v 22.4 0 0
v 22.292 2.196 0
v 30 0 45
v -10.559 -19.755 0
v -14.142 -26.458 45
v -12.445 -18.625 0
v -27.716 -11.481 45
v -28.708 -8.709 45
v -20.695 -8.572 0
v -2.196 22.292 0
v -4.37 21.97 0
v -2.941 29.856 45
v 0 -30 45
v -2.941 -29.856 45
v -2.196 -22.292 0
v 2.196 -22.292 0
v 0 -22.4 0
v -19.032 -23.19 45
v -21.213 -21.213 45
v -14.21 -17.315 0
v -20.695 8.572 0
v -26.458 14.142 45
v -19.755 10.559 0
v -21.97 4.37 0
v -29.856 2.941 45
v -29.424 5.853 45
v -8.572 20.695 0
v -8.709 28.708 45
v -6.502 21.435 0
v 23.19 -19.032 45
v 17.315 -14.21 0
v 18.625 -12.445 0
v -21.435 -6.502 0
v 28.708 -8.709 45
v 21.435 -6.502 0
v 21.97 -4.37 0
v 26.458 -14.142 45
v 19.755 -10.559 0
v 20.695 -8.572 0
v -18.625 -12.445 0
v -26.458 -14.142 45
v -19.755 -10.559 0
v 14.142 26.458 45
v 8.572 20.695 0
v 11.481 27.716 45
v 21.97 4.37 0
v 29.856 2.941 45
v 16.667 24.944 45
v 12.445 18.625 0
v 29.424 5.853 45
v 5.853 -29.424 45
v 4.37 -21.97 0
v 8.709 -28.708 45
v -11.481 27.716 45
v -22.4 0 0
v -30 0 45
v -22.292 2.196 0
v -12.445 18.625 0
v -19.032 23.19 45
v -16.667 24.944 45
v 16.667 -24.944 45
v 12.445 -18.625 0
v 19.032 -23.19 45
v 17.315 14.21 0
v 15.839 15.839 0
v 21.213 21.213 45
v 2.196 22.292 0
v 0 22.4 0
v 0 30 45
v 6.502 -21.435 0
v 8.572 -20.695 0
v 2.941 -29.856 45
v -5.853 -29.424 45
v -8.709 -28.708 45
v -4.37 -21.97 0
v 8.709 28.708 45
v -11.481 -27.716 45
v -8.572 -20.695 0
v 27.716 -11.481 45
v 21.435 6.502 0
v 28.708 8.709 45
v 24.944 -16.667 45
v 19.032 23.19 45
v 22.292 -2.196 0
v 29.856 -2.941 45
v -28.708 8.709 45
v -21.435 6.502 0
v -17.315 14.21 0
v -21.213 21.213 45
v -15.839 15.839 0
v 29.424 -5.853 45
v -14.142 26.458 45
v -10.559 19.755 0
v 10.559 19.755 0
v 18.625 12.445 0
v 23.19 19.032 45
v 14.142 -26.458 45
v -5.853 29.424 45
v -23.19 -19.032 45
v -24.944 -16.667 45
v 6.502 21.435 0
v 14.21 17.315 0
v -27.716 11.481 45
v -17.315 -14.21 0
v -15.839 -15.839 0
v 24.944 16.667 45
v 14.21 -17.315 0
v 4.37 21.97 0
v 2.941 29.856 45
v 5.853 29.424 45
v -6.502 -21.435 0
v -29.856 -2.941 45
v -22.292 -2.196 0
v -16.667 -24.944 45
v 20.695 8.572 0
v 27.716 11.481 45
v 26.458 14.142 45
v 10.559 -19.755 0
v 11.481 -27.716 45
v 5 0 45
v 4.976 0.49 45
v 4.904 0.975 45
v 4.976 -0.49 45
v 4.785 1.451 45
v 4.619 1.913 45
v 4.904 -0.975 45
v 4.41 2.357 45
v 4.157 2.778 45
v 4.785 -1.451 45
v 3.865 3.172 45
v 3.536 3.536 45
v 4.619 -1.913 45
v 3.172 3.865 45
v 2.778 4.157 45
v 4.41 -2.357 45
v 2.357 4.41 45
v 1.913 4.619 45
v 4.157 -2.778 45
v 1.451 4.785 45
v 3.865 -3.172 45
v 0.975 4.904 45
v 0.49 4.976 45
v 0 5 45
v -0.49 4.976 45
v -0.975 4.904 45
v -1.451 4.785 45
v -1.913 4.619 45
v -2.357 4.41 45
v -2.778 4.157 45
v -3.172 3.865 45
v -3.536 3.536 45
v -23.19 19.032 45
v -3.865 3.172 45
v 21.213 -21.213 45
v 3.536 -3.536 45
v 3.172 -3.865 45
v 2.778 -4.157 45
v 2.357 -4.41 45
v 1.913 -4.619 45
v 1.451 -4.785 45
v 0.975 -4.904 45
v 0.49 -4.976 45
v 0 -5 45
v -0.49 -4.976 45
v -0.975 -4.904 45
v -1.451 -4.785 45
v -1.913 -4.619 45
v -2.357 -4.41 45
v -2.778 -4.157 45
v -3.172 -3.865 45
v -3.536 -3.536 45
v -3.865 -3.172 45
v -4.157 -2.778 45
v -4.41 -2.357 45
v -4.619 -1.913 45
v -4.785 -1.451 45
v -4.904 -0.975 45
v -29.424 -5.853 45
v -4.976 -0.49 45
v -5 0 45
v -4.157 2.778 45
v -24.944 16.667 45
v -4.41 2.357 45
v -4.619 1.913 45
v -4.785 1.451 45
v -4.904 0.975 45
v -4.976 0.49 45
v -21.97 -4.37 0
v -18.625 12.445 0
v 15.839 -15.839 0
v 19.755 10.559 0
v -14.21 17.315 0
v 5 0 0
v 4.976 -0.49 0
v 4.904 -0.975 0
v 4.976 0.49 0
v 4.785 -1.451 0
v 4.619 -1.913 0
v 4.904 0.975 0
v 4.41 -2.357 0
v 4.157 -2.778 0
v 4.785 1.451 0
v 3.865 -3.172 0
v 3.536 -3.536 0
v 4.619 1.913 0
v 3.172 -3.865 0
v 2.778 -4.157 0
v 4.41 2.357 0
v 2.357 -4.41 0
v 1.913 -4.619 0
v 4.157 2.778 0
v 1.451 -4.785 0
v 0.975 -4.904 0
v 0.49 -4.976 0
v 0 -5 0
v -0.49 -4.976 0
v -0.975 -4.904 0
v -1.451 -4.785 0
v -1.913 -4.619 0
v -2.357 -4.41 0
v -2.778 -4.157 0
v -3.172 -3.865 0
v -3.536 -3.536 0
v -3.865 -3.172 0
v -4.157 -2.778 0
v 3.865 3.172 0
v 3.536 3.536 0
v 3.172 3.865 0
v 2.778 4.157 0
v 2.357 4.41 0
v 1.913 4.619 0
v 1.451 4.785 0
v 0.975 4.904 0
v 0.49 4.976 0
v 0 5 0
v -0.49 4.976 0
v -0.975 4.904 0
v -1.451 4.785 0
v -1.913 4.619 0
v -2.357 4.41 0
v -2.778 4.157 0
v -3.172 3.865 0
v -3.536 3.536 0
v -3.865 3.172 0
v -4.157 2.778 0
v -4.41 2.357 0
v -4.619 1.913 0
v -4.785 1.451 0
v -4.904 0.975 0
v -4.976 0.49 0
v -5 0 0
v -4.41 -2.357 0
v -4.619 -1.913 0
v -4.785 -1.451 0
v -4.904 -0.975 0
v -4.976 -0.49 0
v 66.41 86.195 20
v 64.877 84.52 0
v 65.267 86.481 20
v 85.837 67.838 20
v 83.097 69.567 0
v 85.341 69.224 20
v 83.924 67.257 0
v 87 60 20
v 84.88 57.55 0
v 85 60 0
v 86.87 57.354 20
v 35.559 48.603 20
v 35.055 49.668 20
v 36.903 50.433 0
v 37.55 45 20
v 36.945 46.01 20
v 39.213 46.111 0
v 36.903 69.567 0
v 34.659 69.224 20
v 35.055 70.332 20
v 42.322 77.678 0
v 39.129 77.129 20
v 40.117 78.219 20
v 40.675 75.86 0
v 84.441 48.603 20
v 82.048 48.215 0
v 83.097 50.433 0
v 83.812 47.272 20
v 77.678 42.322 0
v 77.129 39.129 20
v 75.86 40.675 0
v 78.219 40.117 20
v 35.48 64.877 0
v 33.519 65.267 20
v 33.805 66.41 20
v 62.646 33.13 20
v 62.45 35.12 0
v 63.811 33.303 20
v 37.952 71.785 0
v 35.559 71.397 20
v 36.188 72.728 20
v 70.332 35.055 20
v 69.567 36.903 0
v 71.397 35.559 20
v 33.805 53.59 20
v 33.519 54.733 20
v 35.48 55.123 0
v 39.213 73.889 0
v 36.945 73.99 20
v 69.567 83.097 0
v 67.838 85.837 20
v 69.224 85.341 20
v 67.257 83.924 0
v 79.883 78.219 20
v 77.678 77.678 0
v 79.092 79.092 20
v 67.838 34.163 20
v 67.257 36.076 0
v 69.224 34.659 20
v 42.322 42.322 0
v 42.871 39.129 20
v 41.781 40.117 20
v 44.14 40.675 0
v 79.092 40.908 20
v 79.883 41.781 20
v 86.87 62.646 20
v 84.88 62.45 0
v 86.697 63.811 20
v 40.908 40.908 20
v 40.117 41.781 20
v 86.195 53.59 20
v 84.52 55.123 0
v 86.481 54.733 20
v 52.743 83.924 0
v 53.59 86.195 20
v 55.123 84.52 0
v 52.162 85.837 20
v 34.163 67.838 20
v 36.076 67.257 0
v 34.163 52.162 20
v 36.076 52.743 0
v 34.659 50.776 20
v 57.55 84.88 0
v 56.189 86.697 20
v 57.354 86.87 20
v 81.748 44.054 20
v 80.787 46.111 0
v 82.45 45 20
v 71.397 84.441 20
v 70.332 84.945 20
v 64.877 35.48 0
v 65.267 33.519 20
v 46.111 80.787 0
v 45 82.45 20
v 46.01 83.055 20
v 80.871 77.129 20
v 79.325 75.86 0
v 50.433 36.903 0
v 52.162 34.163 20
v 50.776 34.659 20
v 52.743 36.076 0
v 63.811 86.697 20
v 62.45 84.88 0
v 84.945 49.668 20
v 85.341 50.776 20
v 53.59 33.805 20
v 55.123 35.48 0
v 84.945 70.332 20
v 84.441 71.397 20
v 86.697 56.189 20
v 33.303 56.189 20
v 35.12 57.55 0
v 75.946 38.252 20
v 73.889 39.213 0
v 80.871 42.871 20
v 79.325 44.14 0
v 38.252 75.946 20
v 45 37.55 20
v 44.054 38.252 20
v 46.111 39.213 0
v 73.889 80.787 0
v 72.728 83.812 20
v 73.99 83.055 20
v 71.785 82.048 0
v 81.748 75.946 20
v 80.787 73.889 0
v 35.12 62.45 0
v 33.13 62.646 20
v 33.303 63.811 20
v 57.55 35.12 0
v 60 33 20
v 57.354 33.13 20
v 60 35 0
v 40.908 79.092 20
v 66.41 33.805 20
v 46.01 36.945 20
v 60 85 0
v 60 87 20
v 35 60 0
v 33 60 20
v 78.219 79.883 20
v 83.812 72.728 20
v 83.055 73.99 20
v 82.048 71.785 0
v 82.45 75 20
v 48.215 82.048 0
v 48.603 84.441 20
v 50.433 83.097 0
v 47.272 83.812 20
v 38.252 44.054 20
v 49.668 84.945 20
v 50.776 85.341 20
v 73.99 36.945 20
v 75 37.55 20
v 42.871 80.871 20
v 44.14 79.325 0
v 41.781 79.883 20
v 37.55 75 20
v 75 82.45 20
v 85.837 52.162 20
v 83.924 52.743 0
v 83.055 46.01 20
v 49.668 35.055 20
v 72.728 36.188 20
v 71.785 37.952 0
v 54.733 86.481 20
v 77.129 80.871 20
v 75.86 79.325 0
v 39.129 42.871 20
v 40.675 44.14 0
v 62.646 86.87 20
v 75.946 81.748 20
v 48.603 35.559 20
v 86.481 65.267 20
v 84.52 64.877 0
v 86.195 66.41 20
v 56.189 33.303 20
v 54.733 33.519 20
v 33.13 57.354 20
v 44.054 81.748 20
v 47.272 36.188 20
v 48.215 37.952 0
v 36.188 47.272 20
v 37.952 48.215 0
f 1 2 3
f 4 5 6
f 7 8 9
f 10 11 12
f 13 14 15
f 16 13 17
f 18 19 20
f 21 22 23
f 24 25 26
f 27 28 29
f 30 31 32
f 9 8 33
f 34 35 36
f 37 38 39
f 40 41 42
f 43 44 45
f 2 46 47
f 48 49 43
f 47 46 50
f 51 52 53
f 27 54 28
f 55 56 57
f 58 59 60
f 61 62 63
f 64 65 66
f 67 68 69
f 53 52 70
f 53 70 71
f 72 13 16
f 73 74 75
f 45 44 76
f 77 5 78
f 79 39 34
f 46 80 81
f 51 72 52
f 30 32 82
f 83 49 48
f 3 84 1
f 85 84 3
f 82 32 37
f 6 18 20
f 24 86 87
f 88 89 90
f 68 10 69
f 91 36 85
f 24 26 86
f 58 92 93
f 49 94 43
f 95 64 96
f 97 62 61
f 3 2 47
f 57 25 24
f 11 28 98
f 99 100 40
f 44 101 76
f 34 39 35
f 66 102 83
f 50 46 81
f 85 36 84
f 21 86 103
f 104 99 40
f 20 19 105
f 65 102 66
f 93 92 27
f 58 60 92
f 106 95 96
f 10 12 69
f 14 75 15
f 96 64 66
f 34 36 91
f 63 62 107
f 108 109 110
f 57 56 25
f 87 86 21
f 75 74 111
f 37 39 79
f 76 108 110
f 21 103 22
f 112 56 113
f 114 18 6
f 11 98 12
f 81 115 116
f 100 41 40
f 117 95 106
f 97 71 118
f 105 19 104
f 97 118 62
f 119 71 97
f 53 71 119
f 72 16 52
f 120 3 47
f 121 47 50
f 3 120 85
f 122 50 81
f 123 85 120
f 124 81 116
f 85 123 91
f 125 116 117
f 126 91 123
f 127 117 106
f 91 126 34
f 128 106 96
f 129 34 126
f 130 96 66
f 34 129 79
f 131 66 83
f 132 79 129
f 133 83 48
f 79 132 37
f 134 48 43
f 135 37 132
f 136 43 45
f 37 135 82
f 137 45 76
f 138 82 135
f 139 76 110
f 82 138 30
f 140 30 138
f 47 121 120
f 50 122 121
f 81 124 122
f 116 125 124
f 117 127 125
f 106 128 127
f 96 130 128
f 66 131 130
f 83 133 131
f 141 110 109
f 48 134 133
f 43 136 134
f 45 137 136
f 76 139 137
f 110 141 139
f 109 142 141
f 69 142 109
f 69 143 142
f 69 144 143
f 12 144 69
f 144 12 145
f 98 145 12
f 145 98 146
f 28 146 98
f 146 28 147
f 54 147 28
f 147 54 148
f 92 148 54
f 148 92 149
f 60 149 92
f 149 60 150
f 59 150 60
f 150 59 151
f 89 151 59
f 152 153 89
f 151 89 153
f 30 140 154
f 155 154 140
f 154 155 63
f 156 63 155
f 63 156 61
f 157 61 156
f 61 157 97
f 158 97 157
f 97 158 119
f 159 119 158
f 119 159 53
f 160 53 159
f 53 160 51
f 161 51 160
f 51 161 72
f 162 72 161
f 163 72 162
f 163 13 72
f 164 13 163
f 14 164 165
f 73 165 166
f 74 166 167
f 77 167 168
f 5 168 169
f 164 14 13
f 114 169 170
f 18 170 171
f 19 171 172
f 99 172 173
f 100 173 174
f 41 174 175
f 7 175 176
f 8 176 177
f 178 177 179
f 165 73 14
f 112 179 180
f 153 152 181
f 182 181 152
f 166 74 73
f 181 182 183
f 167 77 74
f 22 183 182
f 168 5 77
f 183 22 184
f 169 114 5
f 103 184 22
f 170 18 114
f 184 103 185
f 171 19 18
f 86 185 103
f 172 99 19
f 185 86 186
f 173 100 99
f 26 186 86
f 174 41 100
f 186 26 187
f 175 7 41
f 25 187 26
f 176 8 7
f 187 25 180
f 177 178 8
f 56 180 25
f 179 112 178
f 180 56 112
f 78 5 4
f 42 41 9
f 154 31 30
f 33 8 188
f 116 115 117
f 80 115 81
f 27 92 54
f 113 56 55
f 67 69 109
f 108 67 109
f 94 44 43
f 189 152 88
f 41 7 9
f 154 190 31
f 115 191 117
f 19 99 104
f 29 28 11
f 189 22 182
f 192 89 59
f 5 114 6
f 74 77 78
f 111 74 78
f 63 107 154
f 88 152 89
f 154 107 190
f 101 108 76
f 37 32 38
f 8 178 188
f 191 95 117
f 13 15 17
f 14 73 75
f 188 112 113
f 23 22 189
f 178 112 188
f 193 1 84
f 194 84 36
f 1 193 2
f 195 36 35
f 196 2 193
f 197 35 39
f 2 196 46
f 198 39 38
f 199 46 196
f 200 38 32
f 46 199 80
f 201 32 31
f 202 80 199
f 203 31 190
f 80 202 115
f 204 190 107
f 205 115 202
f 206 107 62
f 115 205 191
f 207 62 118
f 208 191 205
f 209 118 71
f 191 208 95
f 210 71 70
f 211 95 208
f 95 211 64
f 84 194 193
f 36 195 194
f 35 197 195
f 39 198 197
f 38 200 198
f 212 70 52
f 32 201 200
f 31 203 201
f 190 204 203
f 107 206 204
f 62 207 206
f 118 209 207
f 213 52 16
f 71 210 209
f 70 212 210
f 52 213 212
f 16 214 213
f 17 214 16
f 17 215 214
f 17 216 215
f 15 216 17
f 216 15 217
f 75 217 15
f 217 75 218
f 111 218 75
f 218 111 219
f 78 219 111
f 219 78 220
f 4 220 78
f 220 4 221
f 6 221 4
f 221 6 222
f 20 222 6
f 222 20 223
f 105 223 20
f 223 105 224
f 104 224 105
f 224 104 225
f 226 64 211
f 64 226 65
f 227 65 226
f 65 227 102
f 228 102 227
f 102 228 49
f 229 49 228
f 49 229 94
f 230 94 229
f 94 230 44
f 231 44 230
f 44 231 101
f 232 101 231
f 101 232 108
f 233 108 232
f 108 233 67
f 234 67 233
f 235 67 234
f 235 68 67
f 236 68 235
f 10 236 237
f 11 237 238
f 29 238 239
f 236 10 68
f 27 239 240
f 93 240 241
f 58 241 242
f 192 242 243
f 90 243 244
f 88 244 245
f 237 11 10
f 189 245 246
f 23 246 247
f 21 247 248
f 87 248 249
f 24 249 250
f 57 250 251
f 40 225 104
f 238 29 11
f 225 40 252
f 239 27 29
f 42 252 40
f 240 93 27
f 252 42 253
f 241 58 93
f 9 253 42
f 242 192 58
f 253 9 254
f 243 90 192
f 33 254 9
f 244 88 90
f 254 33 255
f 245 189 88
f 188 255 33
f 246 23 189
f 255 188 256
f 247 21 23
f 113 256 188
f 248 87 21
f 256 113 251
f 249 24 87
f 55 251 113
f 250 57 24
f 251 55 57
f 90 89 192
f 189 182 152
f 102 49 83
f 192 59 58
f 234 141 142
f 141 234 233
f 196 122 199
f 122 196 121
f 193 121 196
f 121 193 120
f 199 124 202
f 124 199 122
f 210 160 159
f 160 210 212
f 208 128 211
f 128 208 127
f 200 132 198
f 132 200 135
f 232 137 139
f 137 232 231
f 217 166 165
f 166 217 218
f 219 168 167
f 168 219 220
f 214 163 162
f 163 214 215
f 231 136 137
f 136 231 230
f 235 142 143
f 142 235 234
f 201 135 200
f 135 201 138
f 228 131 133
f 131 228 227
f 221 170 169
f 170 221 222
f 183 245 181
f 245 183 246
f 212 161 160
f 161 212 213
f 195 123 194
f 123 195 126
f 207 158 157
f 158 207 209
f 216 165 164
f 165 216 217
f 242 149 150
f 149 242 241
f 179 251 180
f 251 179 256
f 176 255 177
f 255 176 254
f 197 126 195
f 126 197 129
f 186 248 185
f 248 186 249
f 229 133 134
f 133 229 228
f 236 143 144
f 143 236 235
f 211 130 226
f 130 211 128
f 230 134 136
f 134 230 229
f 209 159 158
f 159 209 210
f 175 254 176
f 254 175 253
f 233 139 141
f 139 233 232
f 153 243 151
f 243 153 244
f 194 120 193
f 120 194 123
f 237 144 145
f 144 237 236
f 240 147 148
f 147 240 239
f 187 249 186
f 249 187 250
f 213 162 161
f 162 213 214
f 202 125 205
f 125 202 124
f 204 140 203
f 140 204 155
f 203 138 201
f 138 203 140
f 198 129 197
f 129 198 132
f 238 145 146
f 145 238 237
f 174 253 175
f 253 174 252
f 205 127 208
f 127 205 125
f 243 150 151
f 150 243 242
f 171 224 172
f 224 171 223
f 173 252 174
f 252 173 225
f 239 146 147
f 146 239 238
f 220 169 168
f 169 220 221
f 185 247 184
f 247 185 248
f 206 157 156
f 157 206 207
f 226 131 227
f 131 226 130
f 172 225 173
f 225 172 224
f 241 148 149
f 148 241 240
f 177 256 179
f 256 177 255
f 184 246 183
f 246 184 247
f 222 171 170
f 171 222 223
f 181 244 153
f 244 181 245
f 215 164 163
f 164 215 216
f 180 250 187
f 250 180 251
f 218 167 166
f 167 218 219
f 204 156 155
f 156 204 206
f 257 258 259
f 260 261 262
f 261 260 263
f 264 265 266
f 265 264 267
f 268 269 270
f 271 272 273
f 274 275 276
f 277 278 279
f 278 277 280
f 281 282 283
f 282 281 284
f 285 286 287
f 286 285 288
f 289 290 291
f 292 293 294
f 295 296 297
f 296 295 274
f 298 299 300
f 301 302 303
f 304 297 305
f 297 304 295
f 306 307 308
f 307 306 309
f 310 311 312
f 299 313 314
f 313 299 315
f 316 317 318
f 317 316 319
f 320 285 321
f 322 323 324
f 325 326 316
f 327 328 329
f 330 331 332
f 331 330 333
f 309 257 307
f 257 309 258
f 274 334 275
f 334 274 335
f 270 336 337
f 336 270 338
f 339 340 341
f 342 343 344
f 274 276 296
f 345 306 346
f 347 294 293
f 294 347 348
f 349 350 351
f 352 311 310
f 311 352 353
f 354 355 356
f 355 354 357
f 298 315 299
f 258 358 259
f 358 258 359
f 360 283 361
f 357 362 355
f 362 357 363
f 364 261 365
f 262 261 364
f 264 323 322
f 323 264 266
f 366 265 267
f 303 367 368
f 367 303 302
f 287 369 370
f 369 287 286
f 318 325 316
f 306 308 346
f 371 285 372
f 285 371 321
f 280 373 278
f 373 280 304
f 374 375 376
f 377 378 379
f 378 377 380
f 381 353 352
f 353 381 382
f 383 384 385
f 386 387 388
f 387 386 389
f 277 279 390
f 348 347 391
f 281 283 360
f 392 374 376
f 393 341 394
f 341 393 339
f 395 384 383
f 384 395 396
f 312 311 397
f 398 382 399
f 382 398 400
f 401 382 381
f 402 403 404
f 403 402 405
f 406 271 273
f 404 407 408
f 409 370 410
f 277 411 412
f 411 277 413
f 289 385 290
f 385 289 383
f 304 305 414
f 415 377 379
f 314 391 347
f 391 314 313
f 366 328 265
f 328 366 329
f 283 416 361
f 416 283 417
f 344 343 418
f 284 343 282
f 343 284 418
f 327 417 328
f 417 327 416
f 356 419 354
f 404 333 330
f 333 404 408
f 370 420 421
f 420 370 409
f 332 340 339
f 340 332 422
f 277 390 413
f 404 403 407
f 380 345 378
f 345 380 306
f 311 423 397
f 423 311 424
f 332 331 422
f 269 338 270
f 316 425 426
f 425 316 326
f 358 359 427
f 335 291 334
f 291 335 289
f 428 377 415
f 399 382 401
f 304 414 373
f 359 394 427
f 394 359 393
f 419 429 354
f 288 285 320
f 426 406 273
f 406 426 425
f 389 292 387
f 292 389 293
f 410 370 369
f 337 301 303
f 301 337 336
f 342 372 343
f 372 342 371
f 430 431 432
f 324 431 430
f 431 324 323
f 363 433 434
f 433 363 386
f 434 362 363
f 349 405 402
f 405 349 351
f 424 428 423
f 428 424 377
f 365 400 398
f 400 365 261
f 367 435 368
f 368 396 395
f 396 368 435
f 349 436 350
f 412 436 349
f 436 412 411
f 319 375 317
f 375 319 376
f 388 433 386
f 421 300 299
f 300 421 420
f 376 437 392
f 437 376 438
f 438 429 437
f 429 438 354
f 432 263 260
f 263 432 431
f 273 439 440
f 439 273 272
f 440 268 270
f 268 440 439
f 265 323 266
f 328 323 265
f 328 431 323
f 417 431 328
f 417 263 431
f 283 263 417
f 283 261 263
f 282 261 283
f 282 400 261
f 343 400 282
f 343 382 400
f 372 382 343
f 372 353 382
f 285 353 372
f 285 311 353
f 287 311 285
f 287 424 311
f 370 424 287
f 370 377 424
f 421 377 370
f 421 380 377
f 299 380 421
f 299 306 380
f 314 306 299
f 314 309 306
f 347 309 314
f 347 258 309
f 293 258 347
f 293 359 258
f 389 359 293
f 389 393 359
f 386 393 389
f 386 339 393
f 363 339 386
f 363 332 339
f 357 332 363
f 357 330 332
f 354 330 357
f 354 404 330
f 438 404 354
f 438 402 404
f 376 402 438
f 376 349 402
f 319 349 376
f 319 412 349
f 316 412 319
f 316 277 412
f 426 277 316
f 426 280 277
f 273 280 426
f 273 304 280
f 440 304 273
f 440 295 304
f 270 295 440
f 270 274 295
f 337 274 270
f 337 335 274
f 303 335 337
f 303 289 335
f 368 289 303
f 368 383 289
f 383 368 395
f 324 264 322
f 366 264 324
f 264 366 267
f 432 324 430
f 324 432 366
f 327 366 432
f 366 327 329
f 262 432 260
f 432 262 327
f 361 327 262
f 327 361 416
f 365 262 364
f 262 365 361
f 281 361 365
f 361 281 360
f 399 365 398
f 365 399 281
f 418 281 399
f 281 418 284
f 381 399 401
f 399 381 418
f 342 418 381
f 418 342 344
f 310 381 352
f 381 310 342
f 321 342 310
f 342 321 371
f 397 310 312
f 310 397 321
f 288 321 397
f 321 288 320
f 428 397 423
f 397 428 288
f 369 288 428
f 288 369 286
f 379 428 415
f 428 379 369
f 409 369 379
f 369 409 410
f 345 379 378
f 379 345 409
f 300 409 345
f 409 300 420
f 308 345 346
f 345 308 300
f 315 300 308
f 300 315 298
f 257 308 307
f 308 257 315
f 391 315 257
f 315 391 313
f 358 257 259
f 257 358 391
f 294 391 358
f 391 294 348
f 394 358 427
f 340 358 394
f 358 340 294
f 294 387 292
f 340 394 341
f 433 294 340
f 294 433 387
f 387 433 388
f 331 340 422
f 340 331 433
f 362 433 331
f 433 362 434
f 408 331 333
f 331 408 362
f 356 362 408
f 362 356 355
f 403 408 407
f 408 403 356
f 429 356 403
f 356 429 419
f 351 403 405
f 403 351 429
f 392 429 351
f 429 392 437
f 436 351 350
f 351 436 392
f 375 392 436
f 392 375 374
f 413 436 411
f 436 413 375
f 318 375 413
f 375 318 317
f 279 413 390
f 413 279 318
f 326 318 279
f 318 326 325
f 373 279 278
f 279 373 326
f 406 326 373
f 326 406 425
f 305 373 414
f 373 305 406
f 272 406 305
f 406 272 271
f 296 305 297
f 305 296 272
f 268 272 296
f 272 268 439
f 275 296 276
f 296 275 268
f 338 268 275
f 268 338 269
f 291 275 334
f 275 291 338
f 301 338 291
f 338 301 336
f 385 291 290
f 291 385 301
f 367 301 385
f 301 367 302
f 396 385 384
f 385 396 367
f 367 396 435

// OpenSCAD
// file: modules/Modules.scad
/*
	This program is free software: you can redistribute it and/or modify
	it under the terms of the GNU General Public License as published by
	the Free Software Foundation, either version 3 of the License, or
	(at your option) any later version.

	This program is distributed in the hope that it will be useful,
	but WITHOUT ANY WARRANTY; without even the implied warranty of
	MERCHANTABILITY or FITNESS FOR A PARTICULAR PURPOSE.  See the
	GNU General Public License for more details.
	
	Purpose:  Hold general use modules for to simplify making of objects
	
	History:	
		01/25/2024	Initial creation
		02/17/2025	Added modules for roundedCube, roundedCylinder
								and FilletedCylinder
		02/23/2025	refactored filletedCylinder to include tapered cylinders
								reference filletedCylinderV1 to see original

*/

/***********************************************************************
****** Module - screwHole
	Create a hole specifically for a screw to go in.
***********************************************************************/
//screwHole();
module screwHole(screwHole=4.5, screwDepth = 10, screwHead = 9, headTaper = 2.3, screwHeadDepth = 5, s=$fn){
	$fn = s;
	// Common size screws	
		// Taper
    translate([0,0,-headTaper])cylinder(d1=screwHole, d2=screwHead, h = headTaper);
		// Shaft
    translate([0,0,-headTaper-screwDepth+.01])cylinder(d=screwHole, h=screwDepth);
		// Top of head opening
    translate([0,0,-.01]) cylinder(d=screwHead, h=screwHeadDepth);
}

/***********************************************************************
****** Module - screwCounterPan
	Create a hole specifically for a screw to go in.
	!!!!!!! NOT FINISHED
***********************************************************************/
//screwCounterPan();
module screwCounterPan(screwHole=4.5, screwDepth = 10, screwHead = 9, headTaper = 2.3, screwHeadDepth = 5, s=$fn){
	$fn = s;
	// Common size screws
	
    translate([0,0,-headTaper])cylinder(d1=screwHole, d2=screwHead, h = headTaper, $fn=20);
    translate([0,0,-headTaper-screwDepth])cylinder(d=screwHole, h=screwDepth, $fn=10);
    translate([0,0,-headTaper-screwDepth])cylinder(d=screwHole, h=screwDepth, $fn=10);
    translate([0,0,0]) cylinder(d=screwHead, h=screwHeadDepth, $fn=10);
}

/***********************************************************************
****** Module - screwCounterFlush
	Create a hole specifically for a screw to go in.
	!!!!!!! NOT FINISHED
***********************************************************************/
//screwCounterFlush();
module screwCounterFlush(screwHole=4.5, screwDepth = 10, screwHead = 9, headTaper = 2.3, screwHeadDepth = 5, s=$fn){
	$fn = s;
	// Common size screws
	
    translate([0,0,-headTaper])cylinder(d1=screwHole, d2=screwHead, h = headTaper, $fn=20);
    translate([0,0,-headTaper-screwDepth])cylinder(d=screwHole, h=screwDepth, $fn=10);
    translate([0,0,-headTaper-screwDepth])cylinder(d=screwHole, h=screwDepth, $fn=10);
    translate([0,0,0]) cylinder(d=screwHead, h=screwHeadDepth, $fn=10);
}

/***********************************************************************
****** Module - roundedCube
	4 various ways to make a cube with soft rounded sides.
***********************************************************************/
//roundedCube(x=50, y=30, z=20, r=5, xyz="x");
//roundedCube(x=50, y=30, z=20, r=5, xyz="y");
//roundedCube(x=50, y=30, z=20, r=5, xyz="z");
//roundedCube(x=50, y=30, z=20, r=5, xyz="all");
//roundedCube(x=50, y=30, z=20, r=5, xyz="all", s=60);
//roundedCube(x=50, y=30, z=20, r=5, xyz="all", s=$fn);
module roundedCube(x=50, y=30, z=20, r=5, xyz="z", s=$fn){
	/* variable definitions
			x = value for x axis
			y = value for y axis
			z = value for z axis
			r = radius
			xyz = axis to have the sides rounded
	*/
	$fn = s;
	hull(){
		if (xyz == "z") {
			translate([r,r,0])cylinder(h=z, r=r);
			translate([x-r,r,0])cylinder(h=z, r=r);
			translate([r,y-r,0])cylinder(h=z, r=r);
			translate([x-r,y-r,0])cylinder(h=z, r=r);
		} else if (xyz == "y") {
			translate([r,0,r])rotate([-90,0,0])cylinder(h=y, r=r);
			translate([x-r,0,r])rotate([-90,0,0])cylinder(h=y, r=r);
			translate([r,0,z-r])rotate([-90,0,0])cylinder(h=y, r=r);
			translate([x-r,0,z-r])rotate([-90,0,0])cylinder(h=y, r=r);
		} else if (xyz == "x") {
			translate([0,r,r])rotate([0,90,0])cylinder(h=x, r=r);
			translate([0,y-r,r])rotate([0,90,0])cylinder(h=x, r=r);
			translate([0,r,z-r])rotate([0,90,0])cylinder(h=x, r=r);
			translate([0,y-r,z-r])rotate([0,90,0])cylinder(h=x, r=r);
		} else if (xyz == "all") {
			minkowski(){
				translate([r,r,r])cube([x-r*2,y-r*2,z-r*2]);
				sphere(r=r);
			}			
		} else { 
			echo("XYZ not set");
		}
	}
}

/***********************************************************************
******* Module - roundedCylinder
	Create a cylinder with nice rounded outter top and bottom
***********************************************************************/
//roundedCylinder();
//roundedCylinder(d=200, h=100, r=5);
//roundedCylinder(td=100, bd=100, tr= 10, br = .1);
//difference(){roundedCylinder(d=20, h=10, r=1, s=60);filletedCylinder(d=5, h=10, tr=2, br=1, pad=0, s=30);}
module roundedCylinder(d=200, td=0, bd=0, h=100, r=5, tr=0, br=0, s=$fn){
	$fn = s;

	// Calulate for one or two radises
	tRad = tr > 0 ? tr : r;
	bRad = br > 0 ? br : r;
	//echo(tRad, bRad);

	// Calculate for one diamater or two.
	tDia = td > 0 ? td : d;
	bDia = bd > 0 ? bd : d;
	//echo(tDia, bDia);

	hull(){
		//Bottom
		translate([0,0,bRad])rotate_extrude()translate([bDia/2-bRad,0,0])circle(r=bRad);
		//Top
		translate([0,0,h-tRad])rotate_extrude()translate([tDia/2-tRad,0,0])circle(r=tRad);
	}
}

/***********************************************************************
******* Module - filletedCylinder
	Create a cylinder with flared top and/or bottoms.
	Used for making rounded top/bottom holes in objects.
	Usage:
		d = diamater
		td = top diamater.  d will be used if not provided
		dd = bottom diamater.  d will be used if not provided
		h = height
		r = radius of the fillet
		tr = top radius.  r will be used if not provided
		br = bottom radius.  r will be used if not provided
		pad = filler around the radius  5 is usually good unless very small
		s = smoothing.  generally let $fn of the object do the work.
***********************************************************************/
//filletedCylinder();
//filletedCylinder(d=50, h=100, r=5, pad=5, s=$fn);
//filletedCylinder(d=10, h=20, tr=1, br=1, pad=.1, s=60);
//difference(){roundedCylinder();filletedCylinder();}
//difference(){roundedCylinder(d=200, h=100, r=5);filletedCylinder(d=50, h=100, tr=10, br=5, pad=5);}
//difference(){roundedCylinder(d=20, h=10, r=1, s=30);filletedCylinder(d=5, h=10, tr=2, br=1, pad=0, s=30);}
//filletedCylinder(d=50, td=20, bd=60, h=100, tr=10, br=5, pad=5, s=$fn);
//difference(){roundedCylinder(s=60);filletedCylinder(d=50, td=50, bd=20, h=100, tr=10, br=5, pad=5, s=$fn);}
module filletedCylinder(d=50, td=0, bd=0, h=100, tr=0, br=0, r=5, pad=5, s=$fn){
	$fn = s;
	shift = .1;

	// Calulate for one or two radises
	tRad = tr > 0 ? tr : r;
	bRad = br > 0 ? br : r;
	//echo(tRad, bRad);

	// Calculate for one diamater or two.
	tDia = td > 0 ? td : d;
	bDia = bd > 0 ? bd : d;
	//echo(tDia, bDia);

	// Calculate the shift of the radius in due to angle of a cone
  trShift = tDia > bDia ? tRad * tan(atan(((tDia/2)-(bDia/2))/h)) : 0;
	brShift = bDia > tDia ? bRad * tan(atan(((bDia/2)-(tDia/2))/h)) : 0;
	//echo(trShift, brShift);

	translate([0,0,-shift])cylinder(h=h+shift*2, r1=bDia/2, r2=tDia/2);
	if ( bRad > 0 ){
		// bottom
		translate([0,0,-shift])
			difference(){
				rotate_extrude()translate([bDia/2-pad-brShift,0,0])square([bRad+pad, bRad]);
				rotate_extrude()translate([bDia/2+bRad-brShift,bRad,0])circle(r=bRad);
			}
	}
	if ( tRad > 0 ){
		// top
		translate([0,0,h-tRad+shift])
			difference(){
				rotate_extrude()translate([tDia/2-pad-trShift,0,0])square([tRad+pad, tRad]);
				rotate_extrude()translate([tDia/2+tRad-trShift,0,0])circle(r=tRad);
			}
	}
}

		// v1 kept for reference.  No longer used
		// module filletedCylinderV1(d=50, h=100, tr=10, br=5, pad=5, s=$fn){
		// 	$fn = s;
		// 	shift = .1;
		// 	translate([0,0,-shift])cylinder(h=h+shift*2, r=d/2);
		// 	if ( br > 0 ){
		// 		// bottom
		// 		translate([0,0,-shift])
		// 			difference(){
		// 				rotate_extrude()translate([d/2-pad,0,0])square([br+pad, br]);
		// 				rotate_extrude()translate([d/2+br,br,0])circle(r=br);
		// 			}
		// 	}
		// 	if ( tr > 0 ){
		// 		// top
		// 		translate([0,0,h-tr+shift])
		// 			difference(){
		// 				rotate_extrude()translate([d/2-pad,0,0])square([tr+pad, tr]);
		// 				rotate_extrude()translate([d/2+tr,0,0])circle(r=tr);
		// 			}
		// 	}
		// }

/***********************************************************************
******* Module - CylinderFillet
	Fillet the outter circumfrence of a cylinder.
***********************************************************************/
//difference(){cylinder(h=20, d=100);cylinderFillet(d = 100, r=5);}
/*difference(){
	cylinder(h=20, d=100);
	cylinderFillet(d = 100, r=5);
	translate([0,0,20])rotate([180,0,0])cylinderFillet(d = 100, r=5, s=60);
}*/
module cylinderFillet(d = 100, r=5, s=$fn){
		$fn = s;
		pad = 0.1;	// Padding to maintain manifold
		translate([0,0,0])
		difference() {
				rotate_extrude(convexity=10)
						translate([d/2-r+pad,-pad,0])
								square(r+pad,r+pad);
				#rotate_extrude(convexity=10)
						translate([d/2-r,r,0])
								circle(r=r);
		}
}
// main file
/*
	This program is free software: you can redistribute it and/or modify
	it under the terms of the GNU General Public License as published by
	the Free Software Foundation, either version 3 of the License, or
	(at your option) any later version.

	This program is distributed in the hope that it will be useful,
	but WITHOUT ANY WARRANTY; without even the implied warranty of
	MERCHANTABILITY or FITNESS FOR A PARTICULAR PURPOSE.  See the
	GNU General Public License for more details.
	
	Purpose:  Parametric flower pot
	GitHub:		
	
	History:	
		04/03/2026	Initial creation

	Notes:
		- nothing special to note

*/

/****** Variables ******************************************************
***********************************************************************/
wallThickness = 1.6;		// Estimated width the spiral vase will be set to
height = 50;			//
bottomDiam = 50;			//
topDiam = 60;				//
potHolePattern = 1;					// (1: Single Hole, 3: 3 holes, 5: 5 holes)
potHoleDiam = 10;				//
withSaucer = true;
saucerGap = 1;
saucerHeight = 20;
saucerGroveQty = 1;
saucerGroveDiam = 5;
saucerIntHeight = 5;

// saucerBottomDiam = 100;
// saucerTopDiam = 120;
// saucerHeight = 20;
// saucerGroveQty = 1;
// saucerGroveDiam = 5;
// saucerWallThick = 1.6;			// Used so Saucer is inside diameter based


// Special variables
$fn = $preview ? 32 : 64;		// 0 is OpenSCAD default

/****** Imports & Includes & Calculations ******************************
***********************************************************************/
include <modules/Modules.scad>

// Global Calculations


/****** The Object *****************************************************
***********************************************************************/
Object();
//translate([topDiam,topDiam,0])FlowerPot();
//translate([-topDiam,-topDiam,0])Saucer();


module Object(topDiam = topDiam, bottomDiam = bottomDiam, height = height, potHolePattern = potHolePattern, 
								potHoleDiam = potHoleDiam, withSaucer = withSaucer, saucerGap = saucerGap, 
								saucerHeight = saucerHeight, saucerGroveQty = saucerGroveQty, saucerGroveDiam = saucerGroveDiam){
	// Rendered Calculations
	pThick = wallThickness;
	pHeight = withSaucer ? height - saucerIntHeight : height;
	pBottomDiam = withSaucer ? bottomDiam-(saucerGap*2)-(wallThickness*2) : bottomDiam;
	pTopDiam = topDiam;
	
	sThick = wallThickness;
	sBottomDiam = bottomDiam;
	sTopDiam = withSaucer ? topDiam+(saucerGap*2)-(wallThickness*2) : topDiam;
	sHeight = withSaucer ? height : saucerHeight;

//should not need these
//potHolePattern = 1;					// (1: Single Hole, 3: 3 holes, 5: 5 holes)
//potHoleDiam = 10;				//
//withSaucer = true;

// not using these now.
// saucerGap = 1;
// saucerHeight = 20;
// saucerGroveQty = 1;
// saucerGroveDiam = 5;
// saucerIntHeight = 5;


	// Start creating the object
	//translate([pHeight,pHeight,0])
	difference(){
		cylinder(h=pHeight, d1=pBottomDiam, d2=topDiam);
		holeGen(potHolePattern = potHolePattern, potHoleDiam = potHoleDiam);
	}
	if (withSaucer == true) {
		translate([topDiam,topDiam,0])
		difference(){
			cylinder(h=sHeight, d1=bottomDiam, d2=topDiam);
			#translate([0,0,saucerHeight])cylinder(h=sHeight, d=topDiam+4);
		}
	}
}

// module Saucer(saucerTopDiam = saucerTopDiam, saucerBottomDiam = saucerBottomDiam, saucerHeight = saucerHeight, saucerGroveQty = saucerGroveQty, saucerGroveDiam = saucerGroveDiam, saucerWallThick = saucerWallThick){
// 	// Rendered Calculations
	
// 	// Start creating the object
// 	difference(){
// 		cylinder(h=saucerHeight, d1=saucerBottomDiam, d2=saucerTopDiam);
// 		#translate([0,0,1])cube([20,20,20]);
// 	}
// }

module holeGen(potHolePattern = potHolePattern, potHoleDiam = potHoleDiam, height = height){
	if (potHolePattern == 1){
		translate([0,0,-1])cylinder (h=height+2, d = potHoleDiam);
	} else {
		cylinder (h=20, d = potHoleDiam);		
	}
}

module groveGen(){

}

/*Some basic commands
translate([0,0,0])
rotate([0,0,0])
cube([0,0,0]);
difference(){}
a = test ? TrueValue : FalseValue ;  // ternary function
*/



/****** Batch Export***************************************************
	Use this module to create multiple exports based on rerenderd values
	https://github.com/bbaumg/3DPrinter/blob/master/export.py
	<modules/export.py>
	
	This script searches for "module export()" and individually renders
	and exports each item in it. Each item is expected to be on its own line. 
	The file name will be the comment on the same line, or the module 
	call if no comment exists. All files will be put in a folder with 
	the same name as the scad file it's created from.
***********************************************************************/
module export() {
	// First option is good if you need or rotate the object with simple variables
	// Second option is good if you just want to render the object without rotation
	// Thrid you could just rotate inline.
	//objectExport(x); //<filename.stl>
	// OR
	//object(x); //<filename.stl>
	// OR
	//rotate([0,0,0])object(x); //<filename.stl>
}

// Calls this to make minor tweaks for batch rendering
//   e.g. rotation of the object for best viewing
module objectExport(var1){
	echo("Rendering Export");
	// Allows for rotation of object for best orientation of STL file
	//    Likely need to rotate 90-180 on z axis.
	rotate([0,0,0])object(var1);
}
